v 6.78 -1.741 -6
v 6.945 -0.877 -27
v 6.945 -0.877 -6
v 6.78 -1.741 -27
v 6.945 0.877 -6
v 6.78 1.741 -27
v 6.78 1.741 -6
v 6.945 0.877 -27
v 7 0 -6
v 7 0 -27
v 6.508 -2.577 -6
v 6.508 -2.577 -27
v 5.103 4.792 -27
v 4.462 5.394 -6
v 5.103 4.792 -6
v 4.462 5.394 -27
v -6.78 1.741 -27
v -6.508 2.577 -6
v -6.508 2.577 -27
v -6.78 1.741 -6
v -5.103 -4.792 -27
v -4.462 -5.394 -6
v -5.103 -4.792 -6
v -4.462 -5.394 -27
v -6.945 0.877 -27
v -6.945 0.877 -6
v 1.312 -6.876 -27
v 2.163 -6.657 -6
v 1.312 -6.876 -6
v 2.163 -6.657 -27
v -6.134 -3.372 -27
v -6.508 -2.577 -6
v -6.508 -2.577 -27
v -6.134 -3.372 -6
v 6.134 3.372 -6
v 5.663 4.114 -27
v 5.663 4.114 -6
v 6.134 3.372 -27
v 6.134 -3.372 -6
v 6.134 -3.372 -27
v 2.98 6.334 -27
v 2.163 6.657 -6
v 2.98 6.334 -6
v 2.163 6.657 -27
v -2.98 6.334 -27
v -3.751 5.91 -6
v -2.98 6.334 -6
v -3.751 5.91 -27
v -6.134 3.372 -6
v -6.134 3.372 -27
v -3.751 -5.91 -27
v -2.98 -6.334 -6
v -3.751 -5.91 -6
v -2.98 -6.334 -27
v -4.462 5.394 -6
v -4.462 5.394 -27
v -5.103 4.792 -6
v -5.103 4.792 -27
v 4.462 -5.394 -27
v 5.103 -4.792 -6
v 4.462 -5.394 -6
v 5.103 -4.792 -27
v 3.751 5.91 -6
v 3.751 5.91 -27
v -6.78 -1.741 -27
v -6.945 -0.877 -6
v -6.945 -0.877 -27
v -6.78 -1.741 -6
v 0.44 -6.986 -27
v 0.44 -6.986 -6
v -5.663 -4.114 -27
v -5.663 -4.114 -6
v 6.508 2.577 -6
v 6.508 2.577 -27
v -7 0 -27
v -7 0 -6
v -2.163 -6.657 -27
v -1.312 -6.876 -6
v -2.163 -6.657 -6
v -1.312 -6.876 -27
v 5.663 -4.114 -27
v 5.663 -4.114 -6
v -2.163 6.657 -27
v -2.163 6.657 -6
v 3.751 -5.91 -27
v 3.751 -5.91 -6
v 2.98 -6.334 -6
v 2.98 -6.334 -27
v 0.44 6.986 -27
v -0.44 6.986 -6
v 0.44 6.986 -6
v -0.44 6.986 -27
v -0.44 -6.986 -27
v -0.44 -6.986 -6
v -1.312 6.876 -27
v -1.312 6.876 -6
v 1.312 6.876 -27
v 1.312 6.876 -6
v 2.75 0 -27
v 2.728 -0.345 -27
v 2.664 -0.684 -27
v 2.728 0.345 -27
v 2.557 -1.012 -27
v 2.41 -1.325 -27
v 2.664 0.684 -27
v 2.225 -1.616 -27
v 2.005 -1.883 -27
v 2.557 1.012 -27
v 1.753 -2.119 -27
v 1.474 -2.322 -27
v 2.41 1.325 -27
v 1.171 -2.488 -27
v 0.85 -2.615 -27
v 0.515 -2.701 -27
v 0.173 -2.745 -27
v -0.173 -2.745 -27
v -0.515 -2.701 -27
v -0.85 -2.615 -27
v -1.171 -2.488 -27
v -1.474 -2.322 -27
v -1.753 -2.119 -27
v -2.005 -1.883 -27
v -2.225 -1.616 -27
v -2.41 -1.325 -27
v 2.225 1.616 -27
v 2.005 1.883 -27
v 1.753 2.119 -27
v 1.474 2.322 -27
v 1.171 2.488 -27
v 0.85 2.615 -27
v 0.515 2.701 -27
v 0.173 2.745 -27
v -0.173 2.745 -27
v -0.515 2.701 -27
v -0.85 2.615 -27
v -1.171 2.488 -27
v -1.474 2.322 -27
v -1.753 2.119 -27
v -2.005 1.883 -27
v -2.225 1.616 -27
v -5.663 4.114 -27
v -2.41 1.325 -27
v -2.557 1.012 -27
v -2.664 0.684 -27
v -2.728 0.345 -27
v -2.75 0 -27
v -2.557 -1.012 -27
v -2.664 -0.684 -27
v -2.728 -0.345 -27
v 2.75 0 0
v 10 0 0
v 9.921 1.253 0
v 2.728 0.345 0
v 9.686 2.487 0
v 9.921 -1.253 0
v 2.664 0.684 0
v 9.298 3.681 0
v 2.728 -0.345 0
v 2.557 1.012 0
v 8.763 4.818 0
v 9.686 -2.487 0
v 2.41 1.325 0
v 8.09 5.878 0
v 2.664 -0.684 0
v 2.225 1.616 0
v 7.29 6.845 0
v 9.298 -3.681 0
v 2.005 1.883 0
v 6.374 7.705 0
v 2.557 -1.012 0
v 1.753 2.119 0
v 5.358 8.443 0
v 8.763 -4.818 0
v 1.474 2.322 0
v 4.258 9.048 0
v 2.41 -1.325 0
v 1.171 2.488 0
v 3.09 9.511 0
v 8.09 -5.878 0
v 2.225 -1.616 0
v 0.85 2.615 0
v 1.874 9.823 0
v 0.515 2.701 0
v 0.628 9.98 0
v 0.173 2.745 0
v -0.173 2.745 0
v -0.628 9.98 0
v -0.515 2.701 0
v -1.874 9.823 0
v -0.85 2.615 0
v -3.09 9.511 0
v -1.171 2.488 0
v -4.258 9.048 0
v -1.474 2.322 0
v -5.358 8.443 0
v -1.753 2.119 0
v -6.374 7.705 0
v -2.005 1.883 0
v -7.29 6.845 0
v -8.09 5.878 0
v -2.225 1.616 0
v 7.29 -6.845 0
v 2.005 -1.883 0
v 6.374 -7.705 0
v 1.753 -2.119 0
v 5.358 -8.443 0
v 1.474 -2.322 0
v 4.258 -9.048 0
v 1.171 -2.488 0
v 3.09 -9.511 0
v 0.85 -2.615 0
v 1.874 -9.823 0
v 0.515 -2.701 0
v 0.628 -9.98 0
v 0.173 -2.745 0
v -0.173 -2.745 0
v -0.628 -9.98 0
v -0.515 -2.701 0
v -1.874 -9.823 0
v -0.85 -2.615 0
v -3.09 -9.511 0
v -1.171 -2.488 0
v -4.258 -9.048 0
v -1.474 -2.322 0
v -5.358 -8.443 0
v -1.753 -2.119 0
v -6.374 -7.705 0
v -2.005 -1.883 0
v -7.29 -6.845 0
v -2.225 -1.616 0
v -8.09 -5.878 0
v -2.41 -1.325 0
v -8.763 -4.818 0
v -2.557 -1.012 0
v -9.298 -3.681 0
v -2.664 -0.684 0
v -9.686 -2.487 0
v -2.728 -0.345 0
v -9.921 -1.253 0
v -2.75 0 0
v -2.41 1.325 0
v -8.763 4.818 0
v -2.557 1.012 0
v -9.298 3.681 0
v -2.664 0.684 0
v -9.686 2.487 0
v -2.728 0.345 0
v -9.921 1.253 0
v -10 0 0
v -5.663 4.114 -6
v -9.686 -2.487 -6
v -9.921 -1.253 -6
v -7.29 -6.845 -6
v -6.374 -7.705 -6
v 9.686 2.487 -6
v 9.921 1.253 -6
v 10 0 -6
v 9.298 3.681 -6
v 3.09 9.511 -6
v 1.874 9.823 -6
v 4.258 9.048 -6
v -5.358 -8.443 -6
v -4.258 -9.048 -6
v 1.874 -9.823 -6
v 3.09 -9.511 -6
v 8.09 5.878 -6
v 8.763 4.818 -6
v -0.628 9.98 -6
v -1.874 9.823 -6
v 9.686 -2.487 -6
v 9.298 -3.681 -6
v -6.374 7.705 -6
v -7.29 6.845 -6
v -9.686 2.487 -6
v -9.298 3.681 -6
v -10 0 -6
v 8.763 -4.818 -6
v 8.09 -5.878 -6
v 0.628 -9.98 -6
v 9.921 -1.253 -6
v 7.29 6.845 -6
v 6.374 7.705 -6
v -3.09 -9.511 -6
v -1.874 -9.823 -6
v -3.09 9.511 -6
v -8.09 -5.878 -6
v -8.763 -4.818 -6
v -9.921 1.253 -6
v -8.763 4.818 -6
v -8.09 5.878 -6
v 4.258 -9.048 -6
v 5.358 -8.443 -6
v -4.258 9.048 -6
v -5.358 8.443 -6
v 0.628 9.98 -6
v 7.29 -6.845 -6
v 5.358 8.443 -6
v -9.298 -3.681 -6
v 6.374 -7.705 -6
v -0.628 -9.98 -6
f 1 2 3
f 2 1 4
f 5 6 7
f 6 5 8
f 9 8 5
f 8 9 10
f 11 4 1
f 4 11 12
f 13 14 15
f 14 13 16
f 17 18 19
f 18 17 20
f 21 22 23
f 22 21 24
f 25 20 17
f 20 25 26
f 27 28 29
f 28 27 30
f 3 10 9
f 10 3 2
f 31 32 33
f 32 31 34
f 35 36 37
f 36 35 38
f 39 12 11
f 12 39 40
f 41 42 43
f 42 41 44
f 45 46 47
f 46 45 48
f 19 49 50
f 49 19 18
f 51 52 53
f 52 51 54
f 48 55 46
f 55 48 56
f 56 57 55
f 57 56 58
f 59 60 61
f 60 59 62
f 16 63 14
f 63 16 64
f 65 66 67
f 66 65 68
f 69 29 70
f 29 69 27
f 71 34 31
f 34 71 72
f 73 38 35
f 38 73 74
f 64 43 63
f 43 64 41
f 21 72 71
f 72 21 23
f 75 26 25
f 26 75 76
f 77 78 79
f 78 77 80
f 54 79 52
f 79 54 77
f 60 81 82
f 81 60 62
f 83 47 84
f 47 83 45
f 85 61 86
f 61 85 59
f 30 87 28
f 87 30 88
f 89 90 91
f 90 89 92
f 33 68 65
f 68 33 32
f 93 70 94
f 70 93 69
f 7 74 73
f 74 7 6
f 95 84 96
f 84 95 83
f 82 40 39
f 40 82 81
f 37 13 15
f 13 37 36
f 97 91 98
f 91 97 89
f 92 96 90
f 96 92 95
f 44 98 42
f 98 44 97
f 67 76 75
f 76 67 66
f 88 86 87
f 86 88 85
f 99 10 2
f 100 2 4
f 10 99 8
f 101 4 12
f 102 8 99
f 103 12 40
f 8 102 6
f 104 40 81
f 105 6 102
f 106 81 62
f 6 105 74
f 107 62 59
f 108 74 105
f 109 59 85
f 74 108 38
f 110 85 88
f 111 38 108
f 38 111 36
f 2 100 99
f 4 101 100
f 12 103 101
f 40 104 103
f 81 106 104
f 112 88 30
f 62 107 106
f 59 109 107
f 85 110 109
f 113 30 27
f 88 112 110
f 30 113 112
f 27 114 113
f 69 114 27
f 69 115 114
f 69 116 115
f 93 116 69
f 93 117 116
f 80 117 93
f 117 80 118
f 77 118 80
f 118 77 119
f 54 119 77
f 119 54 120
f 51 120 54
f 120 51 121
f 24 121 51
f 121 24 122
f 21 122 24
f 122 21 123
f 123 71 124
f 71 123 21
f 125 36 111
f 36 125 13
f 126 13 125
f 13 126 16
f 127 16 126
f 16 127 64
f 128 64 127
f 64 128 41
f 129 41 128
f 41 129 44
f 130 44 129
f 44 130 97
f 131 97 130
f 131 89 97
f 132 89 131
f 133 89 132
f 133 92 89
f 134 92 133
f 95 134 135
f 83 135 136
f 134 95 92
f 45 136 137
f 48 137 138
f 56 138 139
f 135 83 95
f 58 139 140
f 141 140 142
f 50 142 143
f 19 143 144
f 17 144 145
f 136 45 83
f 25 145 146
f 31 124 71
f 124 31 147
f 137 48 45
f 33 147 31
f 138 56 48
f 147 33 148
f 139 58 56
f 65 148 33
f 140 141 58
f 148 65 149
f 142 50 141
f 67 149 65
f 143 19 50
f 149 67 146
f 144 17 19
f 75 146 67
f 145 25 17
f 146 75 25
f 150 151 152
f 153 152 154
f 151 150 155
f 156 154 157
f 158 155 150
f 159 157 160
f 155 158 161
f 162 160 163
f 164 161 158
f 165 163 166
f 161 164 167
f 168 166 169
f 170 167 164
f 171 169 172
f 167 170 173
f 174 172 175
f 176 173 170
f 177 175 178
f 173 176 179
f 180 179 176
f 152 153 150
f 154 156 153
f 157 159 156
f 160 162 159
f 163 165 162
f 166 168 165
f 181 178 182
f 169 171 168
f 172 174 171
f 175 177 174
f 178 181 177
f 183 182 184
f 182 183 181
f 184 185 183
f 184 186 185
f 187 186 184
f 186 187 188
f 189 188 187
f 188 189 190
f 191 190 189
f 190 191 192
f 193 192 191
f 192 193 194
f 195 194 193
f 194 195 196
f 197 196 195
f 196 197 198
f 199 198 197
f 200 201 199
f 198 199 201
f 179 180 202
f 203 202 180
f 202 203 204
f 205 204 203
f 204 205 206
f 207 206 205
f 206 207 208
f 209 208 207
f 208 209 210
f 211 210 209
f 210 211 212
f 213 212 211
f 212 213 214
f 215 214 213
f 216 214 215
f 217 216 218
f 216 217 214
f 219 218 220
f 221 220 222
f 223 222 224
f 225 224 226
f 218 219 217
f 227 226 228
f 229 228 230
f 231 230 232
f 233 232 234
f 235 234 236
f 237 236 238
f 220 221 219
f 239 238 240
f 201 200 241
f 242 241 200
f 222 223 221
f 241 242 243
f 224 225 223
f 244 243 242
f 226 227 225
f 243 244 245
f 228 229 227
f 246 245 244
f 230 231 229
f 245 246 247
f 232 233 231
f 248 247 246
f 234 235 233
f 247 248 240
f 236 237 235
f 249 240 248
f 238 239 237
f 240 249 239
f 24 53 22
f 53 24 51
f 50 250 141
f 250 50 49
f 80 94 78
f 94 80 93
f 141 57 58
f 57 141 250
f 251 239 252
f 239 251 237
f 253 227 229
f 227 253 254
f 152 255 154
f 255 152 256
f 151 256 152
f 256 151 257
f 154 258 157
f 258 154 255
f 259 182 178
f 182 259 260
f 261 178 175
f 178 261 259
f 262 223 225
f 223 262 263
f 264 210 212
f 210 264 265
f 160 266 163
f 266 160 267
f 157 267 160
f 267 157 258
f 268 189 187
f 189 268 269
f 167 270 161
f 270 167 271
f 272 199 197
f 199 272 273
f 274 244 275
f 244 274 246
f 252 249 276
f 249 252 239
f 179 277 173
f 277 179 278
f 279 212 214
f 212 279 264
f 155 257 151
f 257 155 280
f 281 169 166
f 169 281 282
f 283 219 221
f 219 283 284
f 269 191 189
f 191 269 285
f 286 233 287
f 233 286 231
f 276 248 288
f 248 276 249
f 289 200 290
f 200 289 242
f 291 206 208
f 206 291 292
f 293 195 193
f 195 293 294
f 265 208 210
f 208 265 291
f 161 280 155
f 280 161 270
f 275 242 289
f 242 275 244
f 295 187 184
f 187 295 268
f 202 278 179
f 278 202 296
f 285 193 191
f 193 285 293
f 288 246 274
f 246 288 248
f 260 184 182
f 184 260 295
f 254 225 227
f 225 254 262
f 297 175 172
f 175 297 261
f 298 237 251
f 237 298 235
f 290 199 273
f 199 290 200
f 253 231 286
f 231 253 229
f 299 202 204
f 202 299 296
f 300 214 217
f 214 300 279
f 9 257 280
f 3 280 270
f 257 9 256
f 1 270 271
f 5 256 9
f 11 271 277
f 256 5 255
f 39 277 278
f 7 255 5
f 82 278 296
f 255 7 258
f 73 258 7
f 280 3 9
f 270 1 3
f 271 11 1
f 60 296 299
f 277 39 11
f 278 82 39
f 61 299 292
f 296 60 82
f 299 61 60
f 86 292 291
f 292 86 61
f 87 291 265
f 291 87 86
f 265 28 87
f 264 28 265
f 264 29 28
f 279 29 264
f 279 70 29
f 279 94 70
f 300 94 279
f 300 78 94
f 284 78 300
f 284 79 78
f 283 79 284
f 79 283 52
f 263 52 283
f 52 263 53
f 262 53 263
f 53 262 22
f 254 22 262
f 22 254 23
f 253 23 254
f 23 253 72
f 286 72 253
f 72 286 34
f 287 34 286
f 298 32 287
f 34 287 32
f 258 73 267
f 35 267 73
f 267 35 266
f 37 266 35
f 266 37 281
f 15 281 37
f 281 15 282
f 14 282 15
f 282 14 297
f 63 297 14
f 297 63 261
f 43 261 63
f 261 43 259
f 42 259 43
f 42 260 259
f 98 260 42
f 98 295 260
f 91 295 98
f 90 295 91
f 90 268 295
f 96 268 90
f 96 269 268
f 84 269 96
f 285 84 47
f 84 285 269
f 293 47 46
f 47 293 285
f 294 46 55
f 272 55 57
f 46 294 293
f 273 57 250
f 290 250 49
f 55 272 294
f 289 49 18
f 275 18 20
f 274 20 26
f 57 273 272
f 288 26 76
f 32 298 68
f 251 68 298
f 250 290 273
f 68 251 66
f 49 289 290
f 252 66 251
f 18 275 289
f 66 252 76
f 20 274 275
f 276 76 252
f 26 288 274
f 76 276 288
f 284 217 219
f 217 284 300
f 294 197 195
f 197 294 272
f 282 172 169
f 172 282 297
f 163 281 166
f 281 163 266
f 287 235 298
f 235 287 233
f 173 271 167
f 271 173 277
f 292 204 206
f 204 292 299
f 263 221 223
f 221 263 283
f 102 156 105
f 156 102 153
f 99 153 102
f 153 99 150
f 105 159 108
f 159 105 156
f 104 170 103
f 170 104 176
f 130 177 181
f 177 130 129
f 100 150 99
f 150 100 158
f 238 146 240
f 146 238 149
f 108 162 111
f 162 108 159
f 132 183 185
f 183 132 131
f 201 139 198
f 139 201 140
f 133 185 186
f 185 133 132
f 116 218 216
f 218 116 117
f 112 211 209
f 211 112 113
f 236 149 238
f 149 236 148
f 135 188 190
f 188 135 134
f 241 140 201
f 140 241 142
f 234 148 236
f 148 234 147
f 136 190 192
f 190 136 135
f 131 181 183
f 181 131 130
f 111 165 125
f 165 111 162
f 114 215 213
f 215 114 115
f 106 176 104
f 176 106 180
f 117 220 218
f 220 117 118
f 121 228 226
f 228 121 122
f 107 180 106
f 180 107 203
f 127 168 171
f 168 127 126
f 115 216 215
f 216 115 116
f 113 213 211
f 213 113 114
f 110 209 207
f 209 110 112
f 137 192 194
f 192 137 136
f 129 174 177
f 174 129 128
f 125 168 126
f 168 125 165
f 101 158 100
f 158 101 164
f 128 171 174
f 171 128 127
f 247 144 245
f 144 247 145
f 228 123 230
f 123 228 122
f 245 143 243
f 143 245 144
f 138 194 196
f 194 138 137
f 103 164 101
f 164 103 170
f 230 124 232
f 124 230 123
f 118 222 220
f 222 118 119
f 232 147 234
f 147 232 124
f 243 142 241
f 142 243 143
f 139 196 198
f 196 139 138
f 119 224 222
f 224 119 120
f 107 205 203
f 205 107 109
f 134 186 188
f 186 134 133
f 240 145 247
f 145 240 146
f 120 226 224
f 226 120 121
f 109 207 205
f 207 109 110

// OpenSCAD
$fn = 50;


difference() {
	union() {
		translate(v = [0, 0, -27.0000000000]) {
			cylinder(h = 27, r = 7.0000000000);
		}
		translate(v = [0, 0, -6.0000000000]) {
			cylinder(h = 6, r = 10.0000000000);
		}
	}
	union() {
		#translate(v = [0, 0, -27]) {
			cylinder(h = 27, r = 2.7500000000);
		}
	}
}
